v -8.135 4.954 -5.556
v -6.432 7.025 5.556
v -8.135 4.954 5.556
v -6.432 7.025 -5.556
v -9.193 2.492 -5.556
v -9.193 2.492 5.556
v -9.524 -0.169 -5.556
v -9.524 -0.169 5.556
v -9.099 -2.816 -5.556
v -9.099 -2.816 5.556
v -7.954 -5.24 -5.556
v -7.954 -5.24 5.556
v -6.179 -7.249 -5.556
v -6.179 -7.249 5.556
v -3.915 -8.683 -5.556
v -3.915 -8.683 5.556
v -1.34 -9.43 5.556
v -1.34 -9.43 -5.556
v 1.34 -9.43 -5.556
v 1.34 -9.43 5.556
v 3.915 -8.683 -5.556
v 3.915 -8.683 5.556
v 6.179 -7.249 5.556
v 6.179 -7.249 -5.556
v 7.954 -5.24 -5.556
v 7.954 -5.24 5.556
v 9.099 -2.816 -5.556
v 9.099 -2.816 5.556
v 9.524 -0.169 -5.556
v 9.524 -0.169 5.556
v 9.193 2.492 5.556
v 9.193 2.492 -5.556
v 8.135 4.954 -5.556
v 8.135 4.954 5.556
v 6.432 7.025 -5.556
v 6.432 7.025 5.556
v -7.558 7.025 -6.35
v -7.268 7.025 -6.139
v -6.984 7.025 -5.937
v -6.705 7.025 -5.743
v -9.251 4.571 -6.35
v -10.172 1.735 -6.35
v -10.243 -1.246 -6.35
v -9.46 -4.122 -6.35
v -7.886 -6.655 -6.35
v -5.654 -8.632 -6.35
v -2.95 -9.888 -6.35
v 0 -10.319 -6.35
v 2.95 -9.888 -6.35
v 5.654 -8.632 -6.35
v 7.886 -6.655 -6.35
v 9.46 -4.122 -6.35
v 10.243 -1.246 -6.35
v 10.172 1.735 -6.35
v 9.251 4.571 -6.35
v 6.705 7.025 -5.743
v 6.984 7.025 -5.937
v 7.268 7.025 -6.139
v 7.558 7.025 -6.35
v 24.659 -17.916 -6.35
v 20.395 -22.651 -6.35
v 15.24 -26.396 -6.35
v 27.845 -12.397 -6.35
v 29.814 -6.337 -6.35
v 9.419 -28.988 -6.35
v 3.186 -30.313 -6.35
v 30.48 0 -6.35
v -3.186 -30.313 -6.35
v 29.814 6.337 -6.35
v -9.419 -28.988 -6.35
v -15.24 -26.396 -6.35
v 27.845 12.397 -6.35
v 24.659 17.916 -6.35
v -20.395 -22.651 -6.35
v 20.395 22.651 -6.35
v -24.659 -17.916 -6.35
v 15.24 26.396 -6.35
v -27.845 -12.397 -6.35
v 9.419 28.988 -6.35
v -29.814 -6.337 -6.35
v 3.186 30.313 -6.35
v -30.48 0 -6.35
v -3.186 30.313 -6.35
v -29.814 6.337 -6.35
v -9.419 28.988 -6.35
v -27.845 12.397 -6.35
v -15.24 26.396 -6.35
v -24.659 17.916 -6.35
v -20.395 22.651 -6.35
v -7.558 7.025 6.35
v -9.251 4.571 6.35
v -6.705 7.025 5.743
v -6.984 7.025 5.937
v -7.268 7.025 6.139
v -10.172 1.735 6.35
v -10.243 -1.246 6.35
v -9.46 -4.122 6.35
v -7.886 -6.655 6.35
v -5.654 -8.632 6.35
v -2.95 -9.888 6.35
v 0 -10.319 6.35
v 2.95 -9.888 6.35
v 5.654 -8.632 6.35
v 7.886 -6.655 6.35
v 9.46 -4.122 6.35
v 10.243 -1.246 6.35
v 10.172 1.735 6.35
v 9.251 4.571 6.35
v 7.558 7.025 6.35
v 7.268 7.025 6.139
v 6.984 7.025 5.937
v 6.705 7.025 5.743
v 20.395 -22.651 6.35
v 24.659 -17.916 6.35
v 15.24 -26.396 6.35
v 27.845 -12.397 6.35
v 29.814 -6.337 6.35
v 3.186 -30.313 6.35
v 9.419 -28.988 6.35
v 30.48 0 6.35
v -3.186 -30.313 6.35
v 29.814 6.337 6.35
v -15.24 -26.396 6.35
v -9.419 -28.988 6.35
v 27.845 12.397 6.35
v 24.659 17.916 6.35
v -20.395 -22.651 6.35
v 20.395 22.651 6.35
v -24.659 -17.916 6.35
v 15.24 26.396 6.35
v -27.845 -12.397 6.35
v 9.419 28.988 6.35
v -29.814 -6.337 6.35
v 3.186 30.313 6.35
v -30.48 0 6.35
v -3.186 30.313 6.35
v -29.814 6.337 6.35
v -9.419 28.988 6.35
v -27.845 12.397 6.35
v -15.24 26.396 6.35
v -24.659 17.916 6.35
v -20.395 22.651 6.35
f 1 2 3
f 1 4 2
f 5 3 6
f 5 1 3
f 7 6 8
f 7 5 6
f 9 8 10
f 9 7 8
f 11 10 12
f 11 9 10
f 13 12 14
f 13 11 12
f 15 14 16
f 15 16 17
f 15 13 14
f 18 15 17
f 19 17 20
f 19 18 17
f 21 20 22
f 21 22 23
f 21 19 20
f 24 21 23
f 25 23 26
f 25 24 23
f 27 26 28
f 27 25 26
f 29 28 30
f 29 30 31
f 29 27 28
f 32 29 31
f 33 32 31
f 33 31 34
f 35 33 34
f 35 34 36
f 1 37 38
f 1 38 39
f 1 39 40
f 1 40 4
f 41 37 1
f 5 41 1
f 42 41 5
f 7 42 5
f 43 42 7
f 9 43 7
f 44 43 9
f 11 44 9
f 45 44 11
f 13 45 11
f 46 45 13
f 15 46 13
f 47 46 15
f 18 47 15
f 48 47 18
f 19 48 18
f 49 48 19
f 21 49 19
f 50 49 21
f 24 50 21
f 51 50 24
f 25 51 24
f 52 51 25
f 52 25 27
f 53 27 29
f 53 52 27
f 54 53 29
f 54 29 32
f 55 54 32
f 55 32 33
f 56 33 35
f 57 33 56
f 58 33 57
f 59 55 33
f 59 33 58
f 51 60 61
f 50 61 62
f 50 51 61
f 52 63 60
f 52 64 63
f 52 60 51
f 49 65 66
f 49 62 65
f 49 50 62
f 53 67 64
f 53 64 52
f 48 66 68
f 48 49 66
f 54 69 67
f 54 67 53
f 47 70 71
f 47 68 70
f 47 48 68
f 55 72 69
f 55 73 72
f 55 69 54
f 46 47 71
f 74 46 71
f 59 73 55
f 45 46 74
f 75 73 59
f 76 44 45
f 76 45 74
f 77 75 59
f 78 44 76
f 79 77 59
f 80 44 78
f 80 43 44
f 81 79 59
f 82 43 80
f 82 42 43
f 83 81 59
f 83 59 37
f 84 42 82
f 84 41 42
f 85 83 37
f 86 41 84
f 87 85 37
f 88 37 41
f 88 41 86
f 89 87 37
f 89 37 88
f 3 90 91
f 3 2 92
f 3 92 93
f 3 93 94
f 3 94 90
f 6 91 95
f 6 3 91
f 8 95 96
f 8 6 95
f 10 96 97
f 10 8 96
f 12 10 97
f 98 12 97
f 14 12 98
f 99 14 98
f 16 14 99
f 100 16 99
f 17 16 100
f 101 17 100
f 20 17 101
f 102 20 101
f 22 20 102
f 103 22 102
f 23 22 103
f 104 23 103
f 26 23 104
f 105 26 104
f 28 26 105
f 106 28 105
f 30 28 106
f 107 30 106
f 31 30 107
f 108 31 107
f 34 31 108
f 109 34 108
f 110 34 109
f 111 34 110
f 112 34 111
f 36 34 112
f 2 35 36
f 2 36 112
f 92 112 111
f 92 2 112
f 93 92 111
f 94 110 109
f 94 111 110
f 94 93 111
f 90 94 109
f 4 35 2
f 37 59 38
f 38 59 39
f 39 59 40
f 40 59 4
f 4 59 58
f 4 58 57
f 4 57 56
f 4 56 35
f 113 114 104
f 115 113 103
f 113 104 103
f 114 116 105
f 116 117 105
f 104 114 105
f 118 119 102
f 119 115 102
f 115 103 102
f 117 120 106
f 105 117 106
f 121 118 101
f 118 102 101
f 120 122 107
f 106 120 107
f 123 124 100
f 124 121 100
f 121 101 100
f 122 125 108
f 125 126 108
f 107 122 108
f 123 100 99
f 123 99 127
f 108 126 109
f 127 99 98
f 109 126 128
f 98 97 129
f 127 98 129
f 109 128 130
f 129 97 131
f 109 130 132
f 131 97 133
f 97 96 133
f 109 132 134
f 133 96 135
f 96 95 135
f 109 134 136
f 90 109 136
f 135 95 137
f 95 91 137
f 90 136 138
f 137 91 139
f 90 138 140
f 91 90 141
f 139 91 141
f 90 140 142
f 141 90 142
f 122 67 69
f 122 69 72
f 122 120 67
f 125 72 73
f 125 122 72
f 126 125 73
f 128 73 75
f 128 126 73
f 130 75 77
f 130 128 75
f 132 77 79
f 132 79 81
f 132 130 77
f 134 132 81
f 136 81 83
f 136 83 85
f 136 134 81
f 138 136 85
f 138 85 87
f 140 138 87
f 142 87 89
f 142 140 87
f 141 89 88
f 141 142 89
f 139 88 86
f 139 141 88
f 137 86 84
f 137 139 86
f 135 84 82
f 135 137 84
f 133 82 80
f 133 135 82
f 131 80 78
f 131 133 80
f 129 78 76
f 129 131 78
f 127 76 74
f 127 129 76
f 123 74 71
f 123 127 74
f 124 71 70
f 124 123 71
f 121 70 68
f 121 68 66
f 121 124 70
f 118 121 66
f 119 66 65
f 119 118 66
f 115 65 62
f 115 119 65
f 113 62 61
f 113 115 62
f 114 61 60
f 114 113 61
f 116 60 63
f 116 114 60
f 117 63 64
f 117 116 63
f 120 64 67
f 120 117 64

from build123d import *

# Parameters (mm, degrees)
SKETCH1_R           = 30.48
SKETCH1_R_2         = 9.525
EXTRUDE1_DEPTH      = 6.35
CHAMFER1_SIZE       = 0.79375
BOSS_EXTRUDE1_DEPTH = 12.7


with BuildPart() as part:
    # Sketch1 → Extrude1 (new, symmetric)
    with BuildSketch(Plane.XY):
        Circle(SKETCH1_R)
        Circle(SKETCH1_R_2, mode=Mode.SUBTRACT)
    extrude(amount=EXTRUDE1_DEPTH, both=True)

    # Chamfer1
    chamfer1_edges = [part.edges().sort_by_distance(p)[0] for p in [
        (-9.525, 0, -6.35),
        (-9.525, 0, 6.35),
    ]]
    chamfer(chamfer1_edges, length=CHAMFER1_SIZE)

    # Sketch3 → Boss-Extrude1 (add, through all)
    with BuildSketch(Plane(origin=(0, 0, -6.35), x_dir=(-1, 0, 0), z_dir=(0, 0, -1))):
        with BuildLine():
            ThreePointArc((7.558172832, 7.025), (0, 10.31875), (-7.558172832, 7.025))
            Line((-7.558172832, 7.025), (7.558172832, 7.025))
        make_face()
    extrude(amount=-BOSS_EXTRUDE1_DEPTH)


solid = part.part
